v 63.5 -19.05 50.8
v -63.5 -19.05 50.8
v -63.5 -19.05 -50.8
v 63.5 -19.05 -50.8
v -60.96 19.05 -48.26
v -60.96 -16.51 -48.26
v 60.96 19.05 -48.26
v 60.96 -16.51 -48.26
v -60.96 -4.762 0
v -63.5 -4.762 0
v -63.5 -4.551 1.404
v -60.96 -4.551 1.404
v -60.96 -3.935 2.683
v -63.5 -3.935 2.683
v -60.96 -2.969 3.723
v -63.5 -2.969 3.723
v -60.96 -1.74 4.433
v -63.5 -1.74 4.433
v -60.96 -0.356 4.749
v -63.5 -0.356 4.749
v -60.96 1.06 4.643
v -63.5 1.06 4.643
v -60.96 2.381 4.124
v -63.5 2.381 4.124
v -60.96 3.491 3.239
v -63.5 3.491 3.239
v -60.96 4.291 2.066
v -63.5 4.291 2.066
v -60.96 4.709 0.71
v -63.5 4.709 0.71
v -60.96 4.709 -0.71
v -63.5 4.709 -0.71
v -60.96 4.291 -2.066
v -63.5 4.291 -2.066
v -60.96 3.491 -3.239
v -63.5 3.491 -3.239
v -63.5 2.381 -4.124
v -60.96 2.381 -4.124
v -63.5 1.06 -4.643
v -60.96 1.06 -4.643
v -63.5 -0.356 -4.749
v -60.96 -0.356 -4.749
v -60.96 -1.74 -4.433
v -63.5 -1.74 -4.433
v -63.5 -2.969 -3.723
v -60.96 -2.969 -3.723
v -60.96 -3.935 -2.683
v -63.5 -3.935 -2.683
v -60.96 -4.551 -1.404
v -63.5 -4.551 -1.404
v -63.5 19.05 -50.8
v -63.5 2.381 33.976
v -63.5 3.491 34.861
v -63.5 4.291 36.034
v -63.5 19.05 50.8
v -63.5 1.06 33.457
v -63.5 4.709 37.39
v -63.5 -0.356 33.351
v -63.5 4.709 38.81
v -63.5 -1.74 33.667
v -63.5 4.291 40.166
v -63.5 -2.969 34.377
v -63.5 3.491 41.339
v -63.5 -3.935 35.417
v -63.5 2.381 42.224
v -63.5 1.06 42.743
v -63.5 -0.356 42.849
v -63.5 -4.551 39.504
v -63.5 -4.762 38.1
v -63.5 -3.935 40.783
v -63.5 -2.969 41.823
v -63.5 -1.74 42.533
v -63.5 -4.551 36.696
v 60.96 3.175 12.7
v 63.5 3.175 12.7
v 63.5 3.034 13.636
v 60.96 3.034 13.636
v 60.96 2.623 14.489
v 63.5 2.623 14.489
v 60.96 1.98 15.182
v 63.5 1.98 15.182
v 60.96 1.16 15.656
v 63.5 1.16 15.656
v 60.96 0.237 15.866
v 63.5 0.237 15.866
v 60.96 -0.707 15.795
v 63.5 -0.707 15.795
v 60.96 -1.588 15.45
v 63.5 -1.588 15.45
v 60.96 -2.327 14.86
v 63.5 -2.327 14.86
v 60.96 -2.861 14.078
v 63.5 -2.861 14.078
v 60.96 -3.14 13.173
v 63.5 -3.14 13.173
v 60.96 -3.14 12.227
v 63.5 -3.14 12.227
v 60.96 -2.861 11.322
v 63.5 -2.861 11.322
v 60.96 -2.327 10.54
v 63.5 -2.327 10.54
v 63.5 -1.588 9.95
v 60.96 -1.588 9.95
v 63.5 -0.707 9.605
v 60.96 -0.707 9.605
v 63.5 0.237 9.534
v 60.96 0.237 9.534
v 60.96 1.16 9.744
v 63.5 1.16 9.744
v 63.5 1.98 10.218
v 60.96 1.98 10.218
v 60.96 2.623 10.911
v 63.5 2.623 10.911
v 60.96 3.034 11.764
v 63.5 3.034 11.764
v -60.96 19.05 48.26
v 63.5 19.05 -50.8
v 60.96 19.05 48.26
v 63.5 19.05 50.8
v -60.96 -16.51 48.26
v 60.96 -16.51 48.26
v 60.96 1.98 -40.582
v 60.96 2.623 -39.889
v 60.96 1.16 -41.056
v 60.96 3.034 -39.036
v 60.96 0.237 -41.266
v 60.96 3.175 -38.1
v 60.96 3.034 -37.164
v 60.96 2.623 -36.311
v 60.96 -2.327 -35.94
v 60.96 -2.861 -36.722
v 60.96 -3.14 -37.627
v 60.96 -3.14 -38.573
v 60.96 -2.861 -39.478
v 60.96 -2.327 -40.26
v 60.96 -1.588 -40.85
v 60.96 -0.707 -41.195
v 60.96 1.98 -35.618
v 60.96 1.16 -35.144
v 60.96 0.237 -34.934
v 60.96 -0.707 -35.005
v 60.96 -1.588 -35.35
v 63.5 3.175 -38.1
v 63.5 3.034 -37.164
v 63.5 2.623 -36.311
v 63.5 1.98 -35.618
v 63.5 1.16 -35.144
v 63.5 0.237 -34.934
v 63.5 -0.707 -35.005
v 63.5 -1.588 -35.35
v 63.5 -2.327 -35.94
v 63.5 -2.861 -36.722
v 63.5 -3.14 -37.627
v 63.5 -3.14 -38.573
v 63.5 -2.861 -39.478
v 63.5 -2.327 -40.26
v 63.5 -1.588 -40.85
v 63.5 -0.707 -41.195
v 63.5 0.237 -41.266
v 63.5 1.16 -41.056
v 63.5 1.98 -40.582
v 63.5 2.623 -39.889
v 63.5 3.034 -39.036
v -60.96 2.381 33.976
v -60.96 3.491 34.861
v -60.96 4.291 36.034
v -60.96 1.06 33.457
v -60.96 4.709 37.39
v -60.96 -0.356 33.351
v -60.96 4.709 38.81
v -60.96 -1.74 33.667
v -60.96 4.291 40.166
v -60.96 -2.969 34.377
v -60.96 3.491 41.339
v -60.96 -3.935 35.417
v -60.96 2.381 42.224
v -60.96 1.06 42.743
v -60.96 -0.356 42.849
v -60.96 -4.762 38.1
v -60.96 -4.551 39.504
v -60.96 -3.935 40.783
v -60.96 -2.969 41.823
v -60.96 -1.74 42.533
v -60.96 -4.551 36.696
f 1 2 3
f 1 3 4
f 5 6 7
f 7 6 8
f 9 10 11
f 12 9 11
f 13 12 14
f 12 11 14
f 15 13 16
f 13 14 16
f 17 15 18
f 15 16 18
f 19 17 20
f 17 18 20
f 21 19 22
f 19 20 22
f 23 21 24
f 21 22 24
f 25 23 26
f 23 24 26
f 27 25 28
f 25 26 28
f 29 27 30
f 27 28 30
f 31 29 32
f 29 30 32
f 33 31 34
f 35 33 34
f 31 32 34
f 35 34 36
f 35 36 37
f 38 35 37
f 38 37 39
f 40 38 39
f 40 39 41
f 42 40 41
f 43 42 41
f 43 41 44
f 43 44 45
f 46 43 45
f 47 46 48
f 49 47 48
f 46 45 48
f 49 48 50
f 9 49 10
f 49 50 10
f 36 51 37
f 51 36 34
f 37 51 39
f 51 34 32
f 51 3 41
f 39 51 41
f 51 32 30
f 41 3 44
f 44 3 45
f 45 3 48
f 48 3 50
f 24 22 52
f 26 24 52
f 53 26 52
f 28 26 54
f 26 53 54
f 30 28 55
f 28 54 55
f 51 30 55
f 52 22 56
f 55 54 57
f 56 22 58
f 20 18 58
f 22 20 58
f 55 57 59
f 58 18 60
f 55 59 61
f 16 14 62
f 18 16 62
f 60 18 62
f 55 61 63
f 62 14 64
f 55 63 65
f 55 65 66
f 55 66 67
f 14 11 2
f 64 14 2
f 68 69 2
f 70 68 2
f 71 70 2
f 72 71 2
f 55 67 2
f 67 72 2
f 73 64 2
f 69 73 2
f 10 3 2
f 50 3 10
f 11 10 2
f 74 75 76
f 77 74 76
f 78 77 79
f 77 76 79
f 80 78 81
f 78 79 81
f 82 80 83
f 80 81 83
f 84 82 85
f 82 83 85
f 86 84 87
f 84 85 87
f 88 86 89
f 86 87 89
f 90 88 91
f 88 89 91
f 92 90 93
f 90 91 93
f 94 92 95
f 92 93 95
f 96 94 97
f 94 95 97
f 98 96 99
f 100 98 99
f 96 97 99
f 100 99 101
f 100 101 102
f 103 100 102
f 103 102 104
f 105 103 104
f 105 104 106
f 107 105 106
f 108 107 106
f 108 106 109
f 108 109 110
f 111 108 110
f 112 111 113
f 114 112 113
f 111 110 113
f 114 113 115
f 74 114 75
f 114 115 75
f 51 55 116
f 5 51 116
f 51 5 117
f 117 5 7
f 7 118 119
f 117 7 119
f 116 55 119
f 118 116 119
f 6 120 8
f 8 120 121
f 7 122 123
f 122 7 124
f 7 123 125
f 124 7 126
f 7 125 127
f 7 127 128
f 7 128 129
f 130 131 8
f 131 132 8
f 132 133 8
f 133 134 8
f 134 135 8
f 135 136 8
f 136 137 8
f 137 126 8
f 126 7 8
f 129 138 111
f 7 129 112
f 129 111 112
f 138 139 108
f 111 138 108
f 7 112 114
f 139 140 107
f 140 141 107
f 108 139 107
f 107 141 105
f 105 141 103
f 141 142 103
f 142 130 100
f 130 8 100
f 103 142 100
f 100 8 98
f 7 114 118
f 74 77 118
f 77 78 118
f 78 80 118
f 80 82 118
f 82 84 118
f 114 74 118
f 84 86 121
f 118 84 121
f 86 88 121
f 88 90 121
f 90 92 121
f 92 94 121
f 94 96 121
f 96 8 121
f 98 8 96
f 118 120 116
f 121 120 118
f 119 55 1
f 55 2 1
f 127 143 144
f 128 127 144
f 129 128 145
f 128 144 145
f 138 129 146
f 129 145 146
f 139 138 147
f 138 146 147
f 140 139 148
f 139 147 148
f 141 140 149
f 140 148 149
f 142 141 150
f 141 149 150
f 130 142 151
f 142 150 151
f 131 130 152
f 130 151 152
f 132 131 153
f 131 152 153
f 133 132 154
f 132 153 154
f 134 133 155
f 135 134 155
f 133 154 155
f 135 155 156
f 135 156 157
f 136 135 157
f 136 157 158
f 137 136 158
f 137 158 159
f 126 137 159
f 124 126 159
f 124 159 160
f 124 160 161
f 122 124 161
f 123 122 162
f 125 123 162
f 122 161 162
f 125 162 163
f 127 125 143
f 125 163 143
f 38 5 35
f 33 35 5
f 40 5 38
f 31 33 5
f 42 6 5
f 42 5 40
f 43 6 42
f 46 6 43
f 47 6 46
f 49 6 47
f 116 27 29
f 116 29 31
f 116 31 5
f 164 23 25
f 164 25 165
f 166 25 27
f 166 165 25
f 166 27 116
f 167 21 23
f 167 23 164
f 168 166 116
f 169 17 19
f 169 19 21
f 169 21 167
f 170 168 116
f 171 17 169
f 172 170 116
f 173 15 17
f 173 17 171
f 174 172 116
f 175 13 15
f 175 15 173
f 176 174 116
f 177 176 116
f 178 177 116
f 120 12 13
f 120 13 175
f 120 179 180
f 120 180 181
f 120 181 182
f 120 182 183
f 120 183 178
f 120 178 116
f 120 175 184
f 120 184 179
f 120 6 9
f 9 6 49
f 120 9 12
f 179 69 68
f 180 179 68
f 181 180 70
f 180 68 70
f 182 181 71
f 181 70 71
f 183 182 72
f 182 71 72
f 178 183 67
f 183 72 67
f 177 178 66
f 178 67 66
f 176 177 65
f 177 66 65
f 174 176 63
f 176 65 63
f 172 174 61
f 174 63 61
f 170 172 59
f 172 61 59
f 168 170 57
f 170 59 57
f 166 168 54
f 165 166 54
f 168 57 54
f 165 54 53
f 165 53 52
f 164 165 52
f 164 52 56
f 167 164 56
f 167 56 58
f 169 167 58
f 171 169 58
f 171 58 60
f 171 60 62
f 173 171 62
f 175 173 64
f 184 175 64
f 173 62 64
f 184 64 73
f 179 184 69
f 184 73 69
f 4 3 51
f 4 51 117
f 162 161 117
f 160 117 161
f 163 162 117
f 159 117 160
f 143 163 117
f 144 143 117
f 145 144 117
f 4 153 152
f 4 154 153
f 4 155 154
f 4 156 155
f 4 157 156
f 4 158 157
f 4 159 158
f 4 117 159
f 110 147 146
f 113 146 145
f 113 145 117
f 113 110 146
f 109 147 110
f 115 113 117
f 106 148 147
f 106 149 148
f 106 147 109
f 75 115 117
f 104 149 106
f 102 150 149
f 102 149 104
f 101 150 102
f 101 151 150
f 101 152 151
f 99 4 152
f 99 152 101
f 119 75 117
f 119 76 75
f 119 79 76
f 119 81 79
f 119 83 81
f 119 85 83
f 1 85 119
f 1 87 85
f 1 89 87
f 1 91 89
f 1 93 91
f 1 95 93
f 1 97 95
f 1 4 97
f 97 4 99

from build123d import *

# Parameters (mm, degrees)
F0_W     = 127
F0_H     = 101.6
F1_DEPTH = 19.05
F2_T     = -2.54
F3_R     = 3.175
F4_DEPTH = 2.54
F5_R     = 4.7625
F6_DEPTH = 2.54


with BuildPart() as f1:
    # F0 (on Front) → F1 (new body, symmetric)
    with BuildSketch(Plane.XZ):
        Rectangle(F0_W, F0_H)
    extrude(amount=F1_DEPTH, both=True)

    # F2
    f2_openings = [f1.faces().sort_by_distance(p)[0] for p in [
        (0, 19.05, 0),
    ]]
    offset(amount=F2_T, openings=f2_openings)

    # F3 (on face) → F4 (cut, through all)
    with BuildSketch(Plane.YZ.offset(63.5)):
        with Locations((0, -38.1)):
            Circle(F3_R)
        with Locations((0, 12.7)):
            Circle(F3_R)
    extrude(amount=-F4_DEPTH, mode=Mode.SUBTRACT)

    # F5 (on face) → F6 (cut, through all)
    with BuildSketch(Plane(origin=(-63.5, 0, 0), x_dir=(0, -1, 0), z_dir=(-1, 0, 0))):
        with Locations((0, 38.1)):
            Circle(F5_R)
        Circle(F5_R)
    extrude(amount=-F6_DEPTH, mode=Mode.SUBTRACT)


solid = f1.part
